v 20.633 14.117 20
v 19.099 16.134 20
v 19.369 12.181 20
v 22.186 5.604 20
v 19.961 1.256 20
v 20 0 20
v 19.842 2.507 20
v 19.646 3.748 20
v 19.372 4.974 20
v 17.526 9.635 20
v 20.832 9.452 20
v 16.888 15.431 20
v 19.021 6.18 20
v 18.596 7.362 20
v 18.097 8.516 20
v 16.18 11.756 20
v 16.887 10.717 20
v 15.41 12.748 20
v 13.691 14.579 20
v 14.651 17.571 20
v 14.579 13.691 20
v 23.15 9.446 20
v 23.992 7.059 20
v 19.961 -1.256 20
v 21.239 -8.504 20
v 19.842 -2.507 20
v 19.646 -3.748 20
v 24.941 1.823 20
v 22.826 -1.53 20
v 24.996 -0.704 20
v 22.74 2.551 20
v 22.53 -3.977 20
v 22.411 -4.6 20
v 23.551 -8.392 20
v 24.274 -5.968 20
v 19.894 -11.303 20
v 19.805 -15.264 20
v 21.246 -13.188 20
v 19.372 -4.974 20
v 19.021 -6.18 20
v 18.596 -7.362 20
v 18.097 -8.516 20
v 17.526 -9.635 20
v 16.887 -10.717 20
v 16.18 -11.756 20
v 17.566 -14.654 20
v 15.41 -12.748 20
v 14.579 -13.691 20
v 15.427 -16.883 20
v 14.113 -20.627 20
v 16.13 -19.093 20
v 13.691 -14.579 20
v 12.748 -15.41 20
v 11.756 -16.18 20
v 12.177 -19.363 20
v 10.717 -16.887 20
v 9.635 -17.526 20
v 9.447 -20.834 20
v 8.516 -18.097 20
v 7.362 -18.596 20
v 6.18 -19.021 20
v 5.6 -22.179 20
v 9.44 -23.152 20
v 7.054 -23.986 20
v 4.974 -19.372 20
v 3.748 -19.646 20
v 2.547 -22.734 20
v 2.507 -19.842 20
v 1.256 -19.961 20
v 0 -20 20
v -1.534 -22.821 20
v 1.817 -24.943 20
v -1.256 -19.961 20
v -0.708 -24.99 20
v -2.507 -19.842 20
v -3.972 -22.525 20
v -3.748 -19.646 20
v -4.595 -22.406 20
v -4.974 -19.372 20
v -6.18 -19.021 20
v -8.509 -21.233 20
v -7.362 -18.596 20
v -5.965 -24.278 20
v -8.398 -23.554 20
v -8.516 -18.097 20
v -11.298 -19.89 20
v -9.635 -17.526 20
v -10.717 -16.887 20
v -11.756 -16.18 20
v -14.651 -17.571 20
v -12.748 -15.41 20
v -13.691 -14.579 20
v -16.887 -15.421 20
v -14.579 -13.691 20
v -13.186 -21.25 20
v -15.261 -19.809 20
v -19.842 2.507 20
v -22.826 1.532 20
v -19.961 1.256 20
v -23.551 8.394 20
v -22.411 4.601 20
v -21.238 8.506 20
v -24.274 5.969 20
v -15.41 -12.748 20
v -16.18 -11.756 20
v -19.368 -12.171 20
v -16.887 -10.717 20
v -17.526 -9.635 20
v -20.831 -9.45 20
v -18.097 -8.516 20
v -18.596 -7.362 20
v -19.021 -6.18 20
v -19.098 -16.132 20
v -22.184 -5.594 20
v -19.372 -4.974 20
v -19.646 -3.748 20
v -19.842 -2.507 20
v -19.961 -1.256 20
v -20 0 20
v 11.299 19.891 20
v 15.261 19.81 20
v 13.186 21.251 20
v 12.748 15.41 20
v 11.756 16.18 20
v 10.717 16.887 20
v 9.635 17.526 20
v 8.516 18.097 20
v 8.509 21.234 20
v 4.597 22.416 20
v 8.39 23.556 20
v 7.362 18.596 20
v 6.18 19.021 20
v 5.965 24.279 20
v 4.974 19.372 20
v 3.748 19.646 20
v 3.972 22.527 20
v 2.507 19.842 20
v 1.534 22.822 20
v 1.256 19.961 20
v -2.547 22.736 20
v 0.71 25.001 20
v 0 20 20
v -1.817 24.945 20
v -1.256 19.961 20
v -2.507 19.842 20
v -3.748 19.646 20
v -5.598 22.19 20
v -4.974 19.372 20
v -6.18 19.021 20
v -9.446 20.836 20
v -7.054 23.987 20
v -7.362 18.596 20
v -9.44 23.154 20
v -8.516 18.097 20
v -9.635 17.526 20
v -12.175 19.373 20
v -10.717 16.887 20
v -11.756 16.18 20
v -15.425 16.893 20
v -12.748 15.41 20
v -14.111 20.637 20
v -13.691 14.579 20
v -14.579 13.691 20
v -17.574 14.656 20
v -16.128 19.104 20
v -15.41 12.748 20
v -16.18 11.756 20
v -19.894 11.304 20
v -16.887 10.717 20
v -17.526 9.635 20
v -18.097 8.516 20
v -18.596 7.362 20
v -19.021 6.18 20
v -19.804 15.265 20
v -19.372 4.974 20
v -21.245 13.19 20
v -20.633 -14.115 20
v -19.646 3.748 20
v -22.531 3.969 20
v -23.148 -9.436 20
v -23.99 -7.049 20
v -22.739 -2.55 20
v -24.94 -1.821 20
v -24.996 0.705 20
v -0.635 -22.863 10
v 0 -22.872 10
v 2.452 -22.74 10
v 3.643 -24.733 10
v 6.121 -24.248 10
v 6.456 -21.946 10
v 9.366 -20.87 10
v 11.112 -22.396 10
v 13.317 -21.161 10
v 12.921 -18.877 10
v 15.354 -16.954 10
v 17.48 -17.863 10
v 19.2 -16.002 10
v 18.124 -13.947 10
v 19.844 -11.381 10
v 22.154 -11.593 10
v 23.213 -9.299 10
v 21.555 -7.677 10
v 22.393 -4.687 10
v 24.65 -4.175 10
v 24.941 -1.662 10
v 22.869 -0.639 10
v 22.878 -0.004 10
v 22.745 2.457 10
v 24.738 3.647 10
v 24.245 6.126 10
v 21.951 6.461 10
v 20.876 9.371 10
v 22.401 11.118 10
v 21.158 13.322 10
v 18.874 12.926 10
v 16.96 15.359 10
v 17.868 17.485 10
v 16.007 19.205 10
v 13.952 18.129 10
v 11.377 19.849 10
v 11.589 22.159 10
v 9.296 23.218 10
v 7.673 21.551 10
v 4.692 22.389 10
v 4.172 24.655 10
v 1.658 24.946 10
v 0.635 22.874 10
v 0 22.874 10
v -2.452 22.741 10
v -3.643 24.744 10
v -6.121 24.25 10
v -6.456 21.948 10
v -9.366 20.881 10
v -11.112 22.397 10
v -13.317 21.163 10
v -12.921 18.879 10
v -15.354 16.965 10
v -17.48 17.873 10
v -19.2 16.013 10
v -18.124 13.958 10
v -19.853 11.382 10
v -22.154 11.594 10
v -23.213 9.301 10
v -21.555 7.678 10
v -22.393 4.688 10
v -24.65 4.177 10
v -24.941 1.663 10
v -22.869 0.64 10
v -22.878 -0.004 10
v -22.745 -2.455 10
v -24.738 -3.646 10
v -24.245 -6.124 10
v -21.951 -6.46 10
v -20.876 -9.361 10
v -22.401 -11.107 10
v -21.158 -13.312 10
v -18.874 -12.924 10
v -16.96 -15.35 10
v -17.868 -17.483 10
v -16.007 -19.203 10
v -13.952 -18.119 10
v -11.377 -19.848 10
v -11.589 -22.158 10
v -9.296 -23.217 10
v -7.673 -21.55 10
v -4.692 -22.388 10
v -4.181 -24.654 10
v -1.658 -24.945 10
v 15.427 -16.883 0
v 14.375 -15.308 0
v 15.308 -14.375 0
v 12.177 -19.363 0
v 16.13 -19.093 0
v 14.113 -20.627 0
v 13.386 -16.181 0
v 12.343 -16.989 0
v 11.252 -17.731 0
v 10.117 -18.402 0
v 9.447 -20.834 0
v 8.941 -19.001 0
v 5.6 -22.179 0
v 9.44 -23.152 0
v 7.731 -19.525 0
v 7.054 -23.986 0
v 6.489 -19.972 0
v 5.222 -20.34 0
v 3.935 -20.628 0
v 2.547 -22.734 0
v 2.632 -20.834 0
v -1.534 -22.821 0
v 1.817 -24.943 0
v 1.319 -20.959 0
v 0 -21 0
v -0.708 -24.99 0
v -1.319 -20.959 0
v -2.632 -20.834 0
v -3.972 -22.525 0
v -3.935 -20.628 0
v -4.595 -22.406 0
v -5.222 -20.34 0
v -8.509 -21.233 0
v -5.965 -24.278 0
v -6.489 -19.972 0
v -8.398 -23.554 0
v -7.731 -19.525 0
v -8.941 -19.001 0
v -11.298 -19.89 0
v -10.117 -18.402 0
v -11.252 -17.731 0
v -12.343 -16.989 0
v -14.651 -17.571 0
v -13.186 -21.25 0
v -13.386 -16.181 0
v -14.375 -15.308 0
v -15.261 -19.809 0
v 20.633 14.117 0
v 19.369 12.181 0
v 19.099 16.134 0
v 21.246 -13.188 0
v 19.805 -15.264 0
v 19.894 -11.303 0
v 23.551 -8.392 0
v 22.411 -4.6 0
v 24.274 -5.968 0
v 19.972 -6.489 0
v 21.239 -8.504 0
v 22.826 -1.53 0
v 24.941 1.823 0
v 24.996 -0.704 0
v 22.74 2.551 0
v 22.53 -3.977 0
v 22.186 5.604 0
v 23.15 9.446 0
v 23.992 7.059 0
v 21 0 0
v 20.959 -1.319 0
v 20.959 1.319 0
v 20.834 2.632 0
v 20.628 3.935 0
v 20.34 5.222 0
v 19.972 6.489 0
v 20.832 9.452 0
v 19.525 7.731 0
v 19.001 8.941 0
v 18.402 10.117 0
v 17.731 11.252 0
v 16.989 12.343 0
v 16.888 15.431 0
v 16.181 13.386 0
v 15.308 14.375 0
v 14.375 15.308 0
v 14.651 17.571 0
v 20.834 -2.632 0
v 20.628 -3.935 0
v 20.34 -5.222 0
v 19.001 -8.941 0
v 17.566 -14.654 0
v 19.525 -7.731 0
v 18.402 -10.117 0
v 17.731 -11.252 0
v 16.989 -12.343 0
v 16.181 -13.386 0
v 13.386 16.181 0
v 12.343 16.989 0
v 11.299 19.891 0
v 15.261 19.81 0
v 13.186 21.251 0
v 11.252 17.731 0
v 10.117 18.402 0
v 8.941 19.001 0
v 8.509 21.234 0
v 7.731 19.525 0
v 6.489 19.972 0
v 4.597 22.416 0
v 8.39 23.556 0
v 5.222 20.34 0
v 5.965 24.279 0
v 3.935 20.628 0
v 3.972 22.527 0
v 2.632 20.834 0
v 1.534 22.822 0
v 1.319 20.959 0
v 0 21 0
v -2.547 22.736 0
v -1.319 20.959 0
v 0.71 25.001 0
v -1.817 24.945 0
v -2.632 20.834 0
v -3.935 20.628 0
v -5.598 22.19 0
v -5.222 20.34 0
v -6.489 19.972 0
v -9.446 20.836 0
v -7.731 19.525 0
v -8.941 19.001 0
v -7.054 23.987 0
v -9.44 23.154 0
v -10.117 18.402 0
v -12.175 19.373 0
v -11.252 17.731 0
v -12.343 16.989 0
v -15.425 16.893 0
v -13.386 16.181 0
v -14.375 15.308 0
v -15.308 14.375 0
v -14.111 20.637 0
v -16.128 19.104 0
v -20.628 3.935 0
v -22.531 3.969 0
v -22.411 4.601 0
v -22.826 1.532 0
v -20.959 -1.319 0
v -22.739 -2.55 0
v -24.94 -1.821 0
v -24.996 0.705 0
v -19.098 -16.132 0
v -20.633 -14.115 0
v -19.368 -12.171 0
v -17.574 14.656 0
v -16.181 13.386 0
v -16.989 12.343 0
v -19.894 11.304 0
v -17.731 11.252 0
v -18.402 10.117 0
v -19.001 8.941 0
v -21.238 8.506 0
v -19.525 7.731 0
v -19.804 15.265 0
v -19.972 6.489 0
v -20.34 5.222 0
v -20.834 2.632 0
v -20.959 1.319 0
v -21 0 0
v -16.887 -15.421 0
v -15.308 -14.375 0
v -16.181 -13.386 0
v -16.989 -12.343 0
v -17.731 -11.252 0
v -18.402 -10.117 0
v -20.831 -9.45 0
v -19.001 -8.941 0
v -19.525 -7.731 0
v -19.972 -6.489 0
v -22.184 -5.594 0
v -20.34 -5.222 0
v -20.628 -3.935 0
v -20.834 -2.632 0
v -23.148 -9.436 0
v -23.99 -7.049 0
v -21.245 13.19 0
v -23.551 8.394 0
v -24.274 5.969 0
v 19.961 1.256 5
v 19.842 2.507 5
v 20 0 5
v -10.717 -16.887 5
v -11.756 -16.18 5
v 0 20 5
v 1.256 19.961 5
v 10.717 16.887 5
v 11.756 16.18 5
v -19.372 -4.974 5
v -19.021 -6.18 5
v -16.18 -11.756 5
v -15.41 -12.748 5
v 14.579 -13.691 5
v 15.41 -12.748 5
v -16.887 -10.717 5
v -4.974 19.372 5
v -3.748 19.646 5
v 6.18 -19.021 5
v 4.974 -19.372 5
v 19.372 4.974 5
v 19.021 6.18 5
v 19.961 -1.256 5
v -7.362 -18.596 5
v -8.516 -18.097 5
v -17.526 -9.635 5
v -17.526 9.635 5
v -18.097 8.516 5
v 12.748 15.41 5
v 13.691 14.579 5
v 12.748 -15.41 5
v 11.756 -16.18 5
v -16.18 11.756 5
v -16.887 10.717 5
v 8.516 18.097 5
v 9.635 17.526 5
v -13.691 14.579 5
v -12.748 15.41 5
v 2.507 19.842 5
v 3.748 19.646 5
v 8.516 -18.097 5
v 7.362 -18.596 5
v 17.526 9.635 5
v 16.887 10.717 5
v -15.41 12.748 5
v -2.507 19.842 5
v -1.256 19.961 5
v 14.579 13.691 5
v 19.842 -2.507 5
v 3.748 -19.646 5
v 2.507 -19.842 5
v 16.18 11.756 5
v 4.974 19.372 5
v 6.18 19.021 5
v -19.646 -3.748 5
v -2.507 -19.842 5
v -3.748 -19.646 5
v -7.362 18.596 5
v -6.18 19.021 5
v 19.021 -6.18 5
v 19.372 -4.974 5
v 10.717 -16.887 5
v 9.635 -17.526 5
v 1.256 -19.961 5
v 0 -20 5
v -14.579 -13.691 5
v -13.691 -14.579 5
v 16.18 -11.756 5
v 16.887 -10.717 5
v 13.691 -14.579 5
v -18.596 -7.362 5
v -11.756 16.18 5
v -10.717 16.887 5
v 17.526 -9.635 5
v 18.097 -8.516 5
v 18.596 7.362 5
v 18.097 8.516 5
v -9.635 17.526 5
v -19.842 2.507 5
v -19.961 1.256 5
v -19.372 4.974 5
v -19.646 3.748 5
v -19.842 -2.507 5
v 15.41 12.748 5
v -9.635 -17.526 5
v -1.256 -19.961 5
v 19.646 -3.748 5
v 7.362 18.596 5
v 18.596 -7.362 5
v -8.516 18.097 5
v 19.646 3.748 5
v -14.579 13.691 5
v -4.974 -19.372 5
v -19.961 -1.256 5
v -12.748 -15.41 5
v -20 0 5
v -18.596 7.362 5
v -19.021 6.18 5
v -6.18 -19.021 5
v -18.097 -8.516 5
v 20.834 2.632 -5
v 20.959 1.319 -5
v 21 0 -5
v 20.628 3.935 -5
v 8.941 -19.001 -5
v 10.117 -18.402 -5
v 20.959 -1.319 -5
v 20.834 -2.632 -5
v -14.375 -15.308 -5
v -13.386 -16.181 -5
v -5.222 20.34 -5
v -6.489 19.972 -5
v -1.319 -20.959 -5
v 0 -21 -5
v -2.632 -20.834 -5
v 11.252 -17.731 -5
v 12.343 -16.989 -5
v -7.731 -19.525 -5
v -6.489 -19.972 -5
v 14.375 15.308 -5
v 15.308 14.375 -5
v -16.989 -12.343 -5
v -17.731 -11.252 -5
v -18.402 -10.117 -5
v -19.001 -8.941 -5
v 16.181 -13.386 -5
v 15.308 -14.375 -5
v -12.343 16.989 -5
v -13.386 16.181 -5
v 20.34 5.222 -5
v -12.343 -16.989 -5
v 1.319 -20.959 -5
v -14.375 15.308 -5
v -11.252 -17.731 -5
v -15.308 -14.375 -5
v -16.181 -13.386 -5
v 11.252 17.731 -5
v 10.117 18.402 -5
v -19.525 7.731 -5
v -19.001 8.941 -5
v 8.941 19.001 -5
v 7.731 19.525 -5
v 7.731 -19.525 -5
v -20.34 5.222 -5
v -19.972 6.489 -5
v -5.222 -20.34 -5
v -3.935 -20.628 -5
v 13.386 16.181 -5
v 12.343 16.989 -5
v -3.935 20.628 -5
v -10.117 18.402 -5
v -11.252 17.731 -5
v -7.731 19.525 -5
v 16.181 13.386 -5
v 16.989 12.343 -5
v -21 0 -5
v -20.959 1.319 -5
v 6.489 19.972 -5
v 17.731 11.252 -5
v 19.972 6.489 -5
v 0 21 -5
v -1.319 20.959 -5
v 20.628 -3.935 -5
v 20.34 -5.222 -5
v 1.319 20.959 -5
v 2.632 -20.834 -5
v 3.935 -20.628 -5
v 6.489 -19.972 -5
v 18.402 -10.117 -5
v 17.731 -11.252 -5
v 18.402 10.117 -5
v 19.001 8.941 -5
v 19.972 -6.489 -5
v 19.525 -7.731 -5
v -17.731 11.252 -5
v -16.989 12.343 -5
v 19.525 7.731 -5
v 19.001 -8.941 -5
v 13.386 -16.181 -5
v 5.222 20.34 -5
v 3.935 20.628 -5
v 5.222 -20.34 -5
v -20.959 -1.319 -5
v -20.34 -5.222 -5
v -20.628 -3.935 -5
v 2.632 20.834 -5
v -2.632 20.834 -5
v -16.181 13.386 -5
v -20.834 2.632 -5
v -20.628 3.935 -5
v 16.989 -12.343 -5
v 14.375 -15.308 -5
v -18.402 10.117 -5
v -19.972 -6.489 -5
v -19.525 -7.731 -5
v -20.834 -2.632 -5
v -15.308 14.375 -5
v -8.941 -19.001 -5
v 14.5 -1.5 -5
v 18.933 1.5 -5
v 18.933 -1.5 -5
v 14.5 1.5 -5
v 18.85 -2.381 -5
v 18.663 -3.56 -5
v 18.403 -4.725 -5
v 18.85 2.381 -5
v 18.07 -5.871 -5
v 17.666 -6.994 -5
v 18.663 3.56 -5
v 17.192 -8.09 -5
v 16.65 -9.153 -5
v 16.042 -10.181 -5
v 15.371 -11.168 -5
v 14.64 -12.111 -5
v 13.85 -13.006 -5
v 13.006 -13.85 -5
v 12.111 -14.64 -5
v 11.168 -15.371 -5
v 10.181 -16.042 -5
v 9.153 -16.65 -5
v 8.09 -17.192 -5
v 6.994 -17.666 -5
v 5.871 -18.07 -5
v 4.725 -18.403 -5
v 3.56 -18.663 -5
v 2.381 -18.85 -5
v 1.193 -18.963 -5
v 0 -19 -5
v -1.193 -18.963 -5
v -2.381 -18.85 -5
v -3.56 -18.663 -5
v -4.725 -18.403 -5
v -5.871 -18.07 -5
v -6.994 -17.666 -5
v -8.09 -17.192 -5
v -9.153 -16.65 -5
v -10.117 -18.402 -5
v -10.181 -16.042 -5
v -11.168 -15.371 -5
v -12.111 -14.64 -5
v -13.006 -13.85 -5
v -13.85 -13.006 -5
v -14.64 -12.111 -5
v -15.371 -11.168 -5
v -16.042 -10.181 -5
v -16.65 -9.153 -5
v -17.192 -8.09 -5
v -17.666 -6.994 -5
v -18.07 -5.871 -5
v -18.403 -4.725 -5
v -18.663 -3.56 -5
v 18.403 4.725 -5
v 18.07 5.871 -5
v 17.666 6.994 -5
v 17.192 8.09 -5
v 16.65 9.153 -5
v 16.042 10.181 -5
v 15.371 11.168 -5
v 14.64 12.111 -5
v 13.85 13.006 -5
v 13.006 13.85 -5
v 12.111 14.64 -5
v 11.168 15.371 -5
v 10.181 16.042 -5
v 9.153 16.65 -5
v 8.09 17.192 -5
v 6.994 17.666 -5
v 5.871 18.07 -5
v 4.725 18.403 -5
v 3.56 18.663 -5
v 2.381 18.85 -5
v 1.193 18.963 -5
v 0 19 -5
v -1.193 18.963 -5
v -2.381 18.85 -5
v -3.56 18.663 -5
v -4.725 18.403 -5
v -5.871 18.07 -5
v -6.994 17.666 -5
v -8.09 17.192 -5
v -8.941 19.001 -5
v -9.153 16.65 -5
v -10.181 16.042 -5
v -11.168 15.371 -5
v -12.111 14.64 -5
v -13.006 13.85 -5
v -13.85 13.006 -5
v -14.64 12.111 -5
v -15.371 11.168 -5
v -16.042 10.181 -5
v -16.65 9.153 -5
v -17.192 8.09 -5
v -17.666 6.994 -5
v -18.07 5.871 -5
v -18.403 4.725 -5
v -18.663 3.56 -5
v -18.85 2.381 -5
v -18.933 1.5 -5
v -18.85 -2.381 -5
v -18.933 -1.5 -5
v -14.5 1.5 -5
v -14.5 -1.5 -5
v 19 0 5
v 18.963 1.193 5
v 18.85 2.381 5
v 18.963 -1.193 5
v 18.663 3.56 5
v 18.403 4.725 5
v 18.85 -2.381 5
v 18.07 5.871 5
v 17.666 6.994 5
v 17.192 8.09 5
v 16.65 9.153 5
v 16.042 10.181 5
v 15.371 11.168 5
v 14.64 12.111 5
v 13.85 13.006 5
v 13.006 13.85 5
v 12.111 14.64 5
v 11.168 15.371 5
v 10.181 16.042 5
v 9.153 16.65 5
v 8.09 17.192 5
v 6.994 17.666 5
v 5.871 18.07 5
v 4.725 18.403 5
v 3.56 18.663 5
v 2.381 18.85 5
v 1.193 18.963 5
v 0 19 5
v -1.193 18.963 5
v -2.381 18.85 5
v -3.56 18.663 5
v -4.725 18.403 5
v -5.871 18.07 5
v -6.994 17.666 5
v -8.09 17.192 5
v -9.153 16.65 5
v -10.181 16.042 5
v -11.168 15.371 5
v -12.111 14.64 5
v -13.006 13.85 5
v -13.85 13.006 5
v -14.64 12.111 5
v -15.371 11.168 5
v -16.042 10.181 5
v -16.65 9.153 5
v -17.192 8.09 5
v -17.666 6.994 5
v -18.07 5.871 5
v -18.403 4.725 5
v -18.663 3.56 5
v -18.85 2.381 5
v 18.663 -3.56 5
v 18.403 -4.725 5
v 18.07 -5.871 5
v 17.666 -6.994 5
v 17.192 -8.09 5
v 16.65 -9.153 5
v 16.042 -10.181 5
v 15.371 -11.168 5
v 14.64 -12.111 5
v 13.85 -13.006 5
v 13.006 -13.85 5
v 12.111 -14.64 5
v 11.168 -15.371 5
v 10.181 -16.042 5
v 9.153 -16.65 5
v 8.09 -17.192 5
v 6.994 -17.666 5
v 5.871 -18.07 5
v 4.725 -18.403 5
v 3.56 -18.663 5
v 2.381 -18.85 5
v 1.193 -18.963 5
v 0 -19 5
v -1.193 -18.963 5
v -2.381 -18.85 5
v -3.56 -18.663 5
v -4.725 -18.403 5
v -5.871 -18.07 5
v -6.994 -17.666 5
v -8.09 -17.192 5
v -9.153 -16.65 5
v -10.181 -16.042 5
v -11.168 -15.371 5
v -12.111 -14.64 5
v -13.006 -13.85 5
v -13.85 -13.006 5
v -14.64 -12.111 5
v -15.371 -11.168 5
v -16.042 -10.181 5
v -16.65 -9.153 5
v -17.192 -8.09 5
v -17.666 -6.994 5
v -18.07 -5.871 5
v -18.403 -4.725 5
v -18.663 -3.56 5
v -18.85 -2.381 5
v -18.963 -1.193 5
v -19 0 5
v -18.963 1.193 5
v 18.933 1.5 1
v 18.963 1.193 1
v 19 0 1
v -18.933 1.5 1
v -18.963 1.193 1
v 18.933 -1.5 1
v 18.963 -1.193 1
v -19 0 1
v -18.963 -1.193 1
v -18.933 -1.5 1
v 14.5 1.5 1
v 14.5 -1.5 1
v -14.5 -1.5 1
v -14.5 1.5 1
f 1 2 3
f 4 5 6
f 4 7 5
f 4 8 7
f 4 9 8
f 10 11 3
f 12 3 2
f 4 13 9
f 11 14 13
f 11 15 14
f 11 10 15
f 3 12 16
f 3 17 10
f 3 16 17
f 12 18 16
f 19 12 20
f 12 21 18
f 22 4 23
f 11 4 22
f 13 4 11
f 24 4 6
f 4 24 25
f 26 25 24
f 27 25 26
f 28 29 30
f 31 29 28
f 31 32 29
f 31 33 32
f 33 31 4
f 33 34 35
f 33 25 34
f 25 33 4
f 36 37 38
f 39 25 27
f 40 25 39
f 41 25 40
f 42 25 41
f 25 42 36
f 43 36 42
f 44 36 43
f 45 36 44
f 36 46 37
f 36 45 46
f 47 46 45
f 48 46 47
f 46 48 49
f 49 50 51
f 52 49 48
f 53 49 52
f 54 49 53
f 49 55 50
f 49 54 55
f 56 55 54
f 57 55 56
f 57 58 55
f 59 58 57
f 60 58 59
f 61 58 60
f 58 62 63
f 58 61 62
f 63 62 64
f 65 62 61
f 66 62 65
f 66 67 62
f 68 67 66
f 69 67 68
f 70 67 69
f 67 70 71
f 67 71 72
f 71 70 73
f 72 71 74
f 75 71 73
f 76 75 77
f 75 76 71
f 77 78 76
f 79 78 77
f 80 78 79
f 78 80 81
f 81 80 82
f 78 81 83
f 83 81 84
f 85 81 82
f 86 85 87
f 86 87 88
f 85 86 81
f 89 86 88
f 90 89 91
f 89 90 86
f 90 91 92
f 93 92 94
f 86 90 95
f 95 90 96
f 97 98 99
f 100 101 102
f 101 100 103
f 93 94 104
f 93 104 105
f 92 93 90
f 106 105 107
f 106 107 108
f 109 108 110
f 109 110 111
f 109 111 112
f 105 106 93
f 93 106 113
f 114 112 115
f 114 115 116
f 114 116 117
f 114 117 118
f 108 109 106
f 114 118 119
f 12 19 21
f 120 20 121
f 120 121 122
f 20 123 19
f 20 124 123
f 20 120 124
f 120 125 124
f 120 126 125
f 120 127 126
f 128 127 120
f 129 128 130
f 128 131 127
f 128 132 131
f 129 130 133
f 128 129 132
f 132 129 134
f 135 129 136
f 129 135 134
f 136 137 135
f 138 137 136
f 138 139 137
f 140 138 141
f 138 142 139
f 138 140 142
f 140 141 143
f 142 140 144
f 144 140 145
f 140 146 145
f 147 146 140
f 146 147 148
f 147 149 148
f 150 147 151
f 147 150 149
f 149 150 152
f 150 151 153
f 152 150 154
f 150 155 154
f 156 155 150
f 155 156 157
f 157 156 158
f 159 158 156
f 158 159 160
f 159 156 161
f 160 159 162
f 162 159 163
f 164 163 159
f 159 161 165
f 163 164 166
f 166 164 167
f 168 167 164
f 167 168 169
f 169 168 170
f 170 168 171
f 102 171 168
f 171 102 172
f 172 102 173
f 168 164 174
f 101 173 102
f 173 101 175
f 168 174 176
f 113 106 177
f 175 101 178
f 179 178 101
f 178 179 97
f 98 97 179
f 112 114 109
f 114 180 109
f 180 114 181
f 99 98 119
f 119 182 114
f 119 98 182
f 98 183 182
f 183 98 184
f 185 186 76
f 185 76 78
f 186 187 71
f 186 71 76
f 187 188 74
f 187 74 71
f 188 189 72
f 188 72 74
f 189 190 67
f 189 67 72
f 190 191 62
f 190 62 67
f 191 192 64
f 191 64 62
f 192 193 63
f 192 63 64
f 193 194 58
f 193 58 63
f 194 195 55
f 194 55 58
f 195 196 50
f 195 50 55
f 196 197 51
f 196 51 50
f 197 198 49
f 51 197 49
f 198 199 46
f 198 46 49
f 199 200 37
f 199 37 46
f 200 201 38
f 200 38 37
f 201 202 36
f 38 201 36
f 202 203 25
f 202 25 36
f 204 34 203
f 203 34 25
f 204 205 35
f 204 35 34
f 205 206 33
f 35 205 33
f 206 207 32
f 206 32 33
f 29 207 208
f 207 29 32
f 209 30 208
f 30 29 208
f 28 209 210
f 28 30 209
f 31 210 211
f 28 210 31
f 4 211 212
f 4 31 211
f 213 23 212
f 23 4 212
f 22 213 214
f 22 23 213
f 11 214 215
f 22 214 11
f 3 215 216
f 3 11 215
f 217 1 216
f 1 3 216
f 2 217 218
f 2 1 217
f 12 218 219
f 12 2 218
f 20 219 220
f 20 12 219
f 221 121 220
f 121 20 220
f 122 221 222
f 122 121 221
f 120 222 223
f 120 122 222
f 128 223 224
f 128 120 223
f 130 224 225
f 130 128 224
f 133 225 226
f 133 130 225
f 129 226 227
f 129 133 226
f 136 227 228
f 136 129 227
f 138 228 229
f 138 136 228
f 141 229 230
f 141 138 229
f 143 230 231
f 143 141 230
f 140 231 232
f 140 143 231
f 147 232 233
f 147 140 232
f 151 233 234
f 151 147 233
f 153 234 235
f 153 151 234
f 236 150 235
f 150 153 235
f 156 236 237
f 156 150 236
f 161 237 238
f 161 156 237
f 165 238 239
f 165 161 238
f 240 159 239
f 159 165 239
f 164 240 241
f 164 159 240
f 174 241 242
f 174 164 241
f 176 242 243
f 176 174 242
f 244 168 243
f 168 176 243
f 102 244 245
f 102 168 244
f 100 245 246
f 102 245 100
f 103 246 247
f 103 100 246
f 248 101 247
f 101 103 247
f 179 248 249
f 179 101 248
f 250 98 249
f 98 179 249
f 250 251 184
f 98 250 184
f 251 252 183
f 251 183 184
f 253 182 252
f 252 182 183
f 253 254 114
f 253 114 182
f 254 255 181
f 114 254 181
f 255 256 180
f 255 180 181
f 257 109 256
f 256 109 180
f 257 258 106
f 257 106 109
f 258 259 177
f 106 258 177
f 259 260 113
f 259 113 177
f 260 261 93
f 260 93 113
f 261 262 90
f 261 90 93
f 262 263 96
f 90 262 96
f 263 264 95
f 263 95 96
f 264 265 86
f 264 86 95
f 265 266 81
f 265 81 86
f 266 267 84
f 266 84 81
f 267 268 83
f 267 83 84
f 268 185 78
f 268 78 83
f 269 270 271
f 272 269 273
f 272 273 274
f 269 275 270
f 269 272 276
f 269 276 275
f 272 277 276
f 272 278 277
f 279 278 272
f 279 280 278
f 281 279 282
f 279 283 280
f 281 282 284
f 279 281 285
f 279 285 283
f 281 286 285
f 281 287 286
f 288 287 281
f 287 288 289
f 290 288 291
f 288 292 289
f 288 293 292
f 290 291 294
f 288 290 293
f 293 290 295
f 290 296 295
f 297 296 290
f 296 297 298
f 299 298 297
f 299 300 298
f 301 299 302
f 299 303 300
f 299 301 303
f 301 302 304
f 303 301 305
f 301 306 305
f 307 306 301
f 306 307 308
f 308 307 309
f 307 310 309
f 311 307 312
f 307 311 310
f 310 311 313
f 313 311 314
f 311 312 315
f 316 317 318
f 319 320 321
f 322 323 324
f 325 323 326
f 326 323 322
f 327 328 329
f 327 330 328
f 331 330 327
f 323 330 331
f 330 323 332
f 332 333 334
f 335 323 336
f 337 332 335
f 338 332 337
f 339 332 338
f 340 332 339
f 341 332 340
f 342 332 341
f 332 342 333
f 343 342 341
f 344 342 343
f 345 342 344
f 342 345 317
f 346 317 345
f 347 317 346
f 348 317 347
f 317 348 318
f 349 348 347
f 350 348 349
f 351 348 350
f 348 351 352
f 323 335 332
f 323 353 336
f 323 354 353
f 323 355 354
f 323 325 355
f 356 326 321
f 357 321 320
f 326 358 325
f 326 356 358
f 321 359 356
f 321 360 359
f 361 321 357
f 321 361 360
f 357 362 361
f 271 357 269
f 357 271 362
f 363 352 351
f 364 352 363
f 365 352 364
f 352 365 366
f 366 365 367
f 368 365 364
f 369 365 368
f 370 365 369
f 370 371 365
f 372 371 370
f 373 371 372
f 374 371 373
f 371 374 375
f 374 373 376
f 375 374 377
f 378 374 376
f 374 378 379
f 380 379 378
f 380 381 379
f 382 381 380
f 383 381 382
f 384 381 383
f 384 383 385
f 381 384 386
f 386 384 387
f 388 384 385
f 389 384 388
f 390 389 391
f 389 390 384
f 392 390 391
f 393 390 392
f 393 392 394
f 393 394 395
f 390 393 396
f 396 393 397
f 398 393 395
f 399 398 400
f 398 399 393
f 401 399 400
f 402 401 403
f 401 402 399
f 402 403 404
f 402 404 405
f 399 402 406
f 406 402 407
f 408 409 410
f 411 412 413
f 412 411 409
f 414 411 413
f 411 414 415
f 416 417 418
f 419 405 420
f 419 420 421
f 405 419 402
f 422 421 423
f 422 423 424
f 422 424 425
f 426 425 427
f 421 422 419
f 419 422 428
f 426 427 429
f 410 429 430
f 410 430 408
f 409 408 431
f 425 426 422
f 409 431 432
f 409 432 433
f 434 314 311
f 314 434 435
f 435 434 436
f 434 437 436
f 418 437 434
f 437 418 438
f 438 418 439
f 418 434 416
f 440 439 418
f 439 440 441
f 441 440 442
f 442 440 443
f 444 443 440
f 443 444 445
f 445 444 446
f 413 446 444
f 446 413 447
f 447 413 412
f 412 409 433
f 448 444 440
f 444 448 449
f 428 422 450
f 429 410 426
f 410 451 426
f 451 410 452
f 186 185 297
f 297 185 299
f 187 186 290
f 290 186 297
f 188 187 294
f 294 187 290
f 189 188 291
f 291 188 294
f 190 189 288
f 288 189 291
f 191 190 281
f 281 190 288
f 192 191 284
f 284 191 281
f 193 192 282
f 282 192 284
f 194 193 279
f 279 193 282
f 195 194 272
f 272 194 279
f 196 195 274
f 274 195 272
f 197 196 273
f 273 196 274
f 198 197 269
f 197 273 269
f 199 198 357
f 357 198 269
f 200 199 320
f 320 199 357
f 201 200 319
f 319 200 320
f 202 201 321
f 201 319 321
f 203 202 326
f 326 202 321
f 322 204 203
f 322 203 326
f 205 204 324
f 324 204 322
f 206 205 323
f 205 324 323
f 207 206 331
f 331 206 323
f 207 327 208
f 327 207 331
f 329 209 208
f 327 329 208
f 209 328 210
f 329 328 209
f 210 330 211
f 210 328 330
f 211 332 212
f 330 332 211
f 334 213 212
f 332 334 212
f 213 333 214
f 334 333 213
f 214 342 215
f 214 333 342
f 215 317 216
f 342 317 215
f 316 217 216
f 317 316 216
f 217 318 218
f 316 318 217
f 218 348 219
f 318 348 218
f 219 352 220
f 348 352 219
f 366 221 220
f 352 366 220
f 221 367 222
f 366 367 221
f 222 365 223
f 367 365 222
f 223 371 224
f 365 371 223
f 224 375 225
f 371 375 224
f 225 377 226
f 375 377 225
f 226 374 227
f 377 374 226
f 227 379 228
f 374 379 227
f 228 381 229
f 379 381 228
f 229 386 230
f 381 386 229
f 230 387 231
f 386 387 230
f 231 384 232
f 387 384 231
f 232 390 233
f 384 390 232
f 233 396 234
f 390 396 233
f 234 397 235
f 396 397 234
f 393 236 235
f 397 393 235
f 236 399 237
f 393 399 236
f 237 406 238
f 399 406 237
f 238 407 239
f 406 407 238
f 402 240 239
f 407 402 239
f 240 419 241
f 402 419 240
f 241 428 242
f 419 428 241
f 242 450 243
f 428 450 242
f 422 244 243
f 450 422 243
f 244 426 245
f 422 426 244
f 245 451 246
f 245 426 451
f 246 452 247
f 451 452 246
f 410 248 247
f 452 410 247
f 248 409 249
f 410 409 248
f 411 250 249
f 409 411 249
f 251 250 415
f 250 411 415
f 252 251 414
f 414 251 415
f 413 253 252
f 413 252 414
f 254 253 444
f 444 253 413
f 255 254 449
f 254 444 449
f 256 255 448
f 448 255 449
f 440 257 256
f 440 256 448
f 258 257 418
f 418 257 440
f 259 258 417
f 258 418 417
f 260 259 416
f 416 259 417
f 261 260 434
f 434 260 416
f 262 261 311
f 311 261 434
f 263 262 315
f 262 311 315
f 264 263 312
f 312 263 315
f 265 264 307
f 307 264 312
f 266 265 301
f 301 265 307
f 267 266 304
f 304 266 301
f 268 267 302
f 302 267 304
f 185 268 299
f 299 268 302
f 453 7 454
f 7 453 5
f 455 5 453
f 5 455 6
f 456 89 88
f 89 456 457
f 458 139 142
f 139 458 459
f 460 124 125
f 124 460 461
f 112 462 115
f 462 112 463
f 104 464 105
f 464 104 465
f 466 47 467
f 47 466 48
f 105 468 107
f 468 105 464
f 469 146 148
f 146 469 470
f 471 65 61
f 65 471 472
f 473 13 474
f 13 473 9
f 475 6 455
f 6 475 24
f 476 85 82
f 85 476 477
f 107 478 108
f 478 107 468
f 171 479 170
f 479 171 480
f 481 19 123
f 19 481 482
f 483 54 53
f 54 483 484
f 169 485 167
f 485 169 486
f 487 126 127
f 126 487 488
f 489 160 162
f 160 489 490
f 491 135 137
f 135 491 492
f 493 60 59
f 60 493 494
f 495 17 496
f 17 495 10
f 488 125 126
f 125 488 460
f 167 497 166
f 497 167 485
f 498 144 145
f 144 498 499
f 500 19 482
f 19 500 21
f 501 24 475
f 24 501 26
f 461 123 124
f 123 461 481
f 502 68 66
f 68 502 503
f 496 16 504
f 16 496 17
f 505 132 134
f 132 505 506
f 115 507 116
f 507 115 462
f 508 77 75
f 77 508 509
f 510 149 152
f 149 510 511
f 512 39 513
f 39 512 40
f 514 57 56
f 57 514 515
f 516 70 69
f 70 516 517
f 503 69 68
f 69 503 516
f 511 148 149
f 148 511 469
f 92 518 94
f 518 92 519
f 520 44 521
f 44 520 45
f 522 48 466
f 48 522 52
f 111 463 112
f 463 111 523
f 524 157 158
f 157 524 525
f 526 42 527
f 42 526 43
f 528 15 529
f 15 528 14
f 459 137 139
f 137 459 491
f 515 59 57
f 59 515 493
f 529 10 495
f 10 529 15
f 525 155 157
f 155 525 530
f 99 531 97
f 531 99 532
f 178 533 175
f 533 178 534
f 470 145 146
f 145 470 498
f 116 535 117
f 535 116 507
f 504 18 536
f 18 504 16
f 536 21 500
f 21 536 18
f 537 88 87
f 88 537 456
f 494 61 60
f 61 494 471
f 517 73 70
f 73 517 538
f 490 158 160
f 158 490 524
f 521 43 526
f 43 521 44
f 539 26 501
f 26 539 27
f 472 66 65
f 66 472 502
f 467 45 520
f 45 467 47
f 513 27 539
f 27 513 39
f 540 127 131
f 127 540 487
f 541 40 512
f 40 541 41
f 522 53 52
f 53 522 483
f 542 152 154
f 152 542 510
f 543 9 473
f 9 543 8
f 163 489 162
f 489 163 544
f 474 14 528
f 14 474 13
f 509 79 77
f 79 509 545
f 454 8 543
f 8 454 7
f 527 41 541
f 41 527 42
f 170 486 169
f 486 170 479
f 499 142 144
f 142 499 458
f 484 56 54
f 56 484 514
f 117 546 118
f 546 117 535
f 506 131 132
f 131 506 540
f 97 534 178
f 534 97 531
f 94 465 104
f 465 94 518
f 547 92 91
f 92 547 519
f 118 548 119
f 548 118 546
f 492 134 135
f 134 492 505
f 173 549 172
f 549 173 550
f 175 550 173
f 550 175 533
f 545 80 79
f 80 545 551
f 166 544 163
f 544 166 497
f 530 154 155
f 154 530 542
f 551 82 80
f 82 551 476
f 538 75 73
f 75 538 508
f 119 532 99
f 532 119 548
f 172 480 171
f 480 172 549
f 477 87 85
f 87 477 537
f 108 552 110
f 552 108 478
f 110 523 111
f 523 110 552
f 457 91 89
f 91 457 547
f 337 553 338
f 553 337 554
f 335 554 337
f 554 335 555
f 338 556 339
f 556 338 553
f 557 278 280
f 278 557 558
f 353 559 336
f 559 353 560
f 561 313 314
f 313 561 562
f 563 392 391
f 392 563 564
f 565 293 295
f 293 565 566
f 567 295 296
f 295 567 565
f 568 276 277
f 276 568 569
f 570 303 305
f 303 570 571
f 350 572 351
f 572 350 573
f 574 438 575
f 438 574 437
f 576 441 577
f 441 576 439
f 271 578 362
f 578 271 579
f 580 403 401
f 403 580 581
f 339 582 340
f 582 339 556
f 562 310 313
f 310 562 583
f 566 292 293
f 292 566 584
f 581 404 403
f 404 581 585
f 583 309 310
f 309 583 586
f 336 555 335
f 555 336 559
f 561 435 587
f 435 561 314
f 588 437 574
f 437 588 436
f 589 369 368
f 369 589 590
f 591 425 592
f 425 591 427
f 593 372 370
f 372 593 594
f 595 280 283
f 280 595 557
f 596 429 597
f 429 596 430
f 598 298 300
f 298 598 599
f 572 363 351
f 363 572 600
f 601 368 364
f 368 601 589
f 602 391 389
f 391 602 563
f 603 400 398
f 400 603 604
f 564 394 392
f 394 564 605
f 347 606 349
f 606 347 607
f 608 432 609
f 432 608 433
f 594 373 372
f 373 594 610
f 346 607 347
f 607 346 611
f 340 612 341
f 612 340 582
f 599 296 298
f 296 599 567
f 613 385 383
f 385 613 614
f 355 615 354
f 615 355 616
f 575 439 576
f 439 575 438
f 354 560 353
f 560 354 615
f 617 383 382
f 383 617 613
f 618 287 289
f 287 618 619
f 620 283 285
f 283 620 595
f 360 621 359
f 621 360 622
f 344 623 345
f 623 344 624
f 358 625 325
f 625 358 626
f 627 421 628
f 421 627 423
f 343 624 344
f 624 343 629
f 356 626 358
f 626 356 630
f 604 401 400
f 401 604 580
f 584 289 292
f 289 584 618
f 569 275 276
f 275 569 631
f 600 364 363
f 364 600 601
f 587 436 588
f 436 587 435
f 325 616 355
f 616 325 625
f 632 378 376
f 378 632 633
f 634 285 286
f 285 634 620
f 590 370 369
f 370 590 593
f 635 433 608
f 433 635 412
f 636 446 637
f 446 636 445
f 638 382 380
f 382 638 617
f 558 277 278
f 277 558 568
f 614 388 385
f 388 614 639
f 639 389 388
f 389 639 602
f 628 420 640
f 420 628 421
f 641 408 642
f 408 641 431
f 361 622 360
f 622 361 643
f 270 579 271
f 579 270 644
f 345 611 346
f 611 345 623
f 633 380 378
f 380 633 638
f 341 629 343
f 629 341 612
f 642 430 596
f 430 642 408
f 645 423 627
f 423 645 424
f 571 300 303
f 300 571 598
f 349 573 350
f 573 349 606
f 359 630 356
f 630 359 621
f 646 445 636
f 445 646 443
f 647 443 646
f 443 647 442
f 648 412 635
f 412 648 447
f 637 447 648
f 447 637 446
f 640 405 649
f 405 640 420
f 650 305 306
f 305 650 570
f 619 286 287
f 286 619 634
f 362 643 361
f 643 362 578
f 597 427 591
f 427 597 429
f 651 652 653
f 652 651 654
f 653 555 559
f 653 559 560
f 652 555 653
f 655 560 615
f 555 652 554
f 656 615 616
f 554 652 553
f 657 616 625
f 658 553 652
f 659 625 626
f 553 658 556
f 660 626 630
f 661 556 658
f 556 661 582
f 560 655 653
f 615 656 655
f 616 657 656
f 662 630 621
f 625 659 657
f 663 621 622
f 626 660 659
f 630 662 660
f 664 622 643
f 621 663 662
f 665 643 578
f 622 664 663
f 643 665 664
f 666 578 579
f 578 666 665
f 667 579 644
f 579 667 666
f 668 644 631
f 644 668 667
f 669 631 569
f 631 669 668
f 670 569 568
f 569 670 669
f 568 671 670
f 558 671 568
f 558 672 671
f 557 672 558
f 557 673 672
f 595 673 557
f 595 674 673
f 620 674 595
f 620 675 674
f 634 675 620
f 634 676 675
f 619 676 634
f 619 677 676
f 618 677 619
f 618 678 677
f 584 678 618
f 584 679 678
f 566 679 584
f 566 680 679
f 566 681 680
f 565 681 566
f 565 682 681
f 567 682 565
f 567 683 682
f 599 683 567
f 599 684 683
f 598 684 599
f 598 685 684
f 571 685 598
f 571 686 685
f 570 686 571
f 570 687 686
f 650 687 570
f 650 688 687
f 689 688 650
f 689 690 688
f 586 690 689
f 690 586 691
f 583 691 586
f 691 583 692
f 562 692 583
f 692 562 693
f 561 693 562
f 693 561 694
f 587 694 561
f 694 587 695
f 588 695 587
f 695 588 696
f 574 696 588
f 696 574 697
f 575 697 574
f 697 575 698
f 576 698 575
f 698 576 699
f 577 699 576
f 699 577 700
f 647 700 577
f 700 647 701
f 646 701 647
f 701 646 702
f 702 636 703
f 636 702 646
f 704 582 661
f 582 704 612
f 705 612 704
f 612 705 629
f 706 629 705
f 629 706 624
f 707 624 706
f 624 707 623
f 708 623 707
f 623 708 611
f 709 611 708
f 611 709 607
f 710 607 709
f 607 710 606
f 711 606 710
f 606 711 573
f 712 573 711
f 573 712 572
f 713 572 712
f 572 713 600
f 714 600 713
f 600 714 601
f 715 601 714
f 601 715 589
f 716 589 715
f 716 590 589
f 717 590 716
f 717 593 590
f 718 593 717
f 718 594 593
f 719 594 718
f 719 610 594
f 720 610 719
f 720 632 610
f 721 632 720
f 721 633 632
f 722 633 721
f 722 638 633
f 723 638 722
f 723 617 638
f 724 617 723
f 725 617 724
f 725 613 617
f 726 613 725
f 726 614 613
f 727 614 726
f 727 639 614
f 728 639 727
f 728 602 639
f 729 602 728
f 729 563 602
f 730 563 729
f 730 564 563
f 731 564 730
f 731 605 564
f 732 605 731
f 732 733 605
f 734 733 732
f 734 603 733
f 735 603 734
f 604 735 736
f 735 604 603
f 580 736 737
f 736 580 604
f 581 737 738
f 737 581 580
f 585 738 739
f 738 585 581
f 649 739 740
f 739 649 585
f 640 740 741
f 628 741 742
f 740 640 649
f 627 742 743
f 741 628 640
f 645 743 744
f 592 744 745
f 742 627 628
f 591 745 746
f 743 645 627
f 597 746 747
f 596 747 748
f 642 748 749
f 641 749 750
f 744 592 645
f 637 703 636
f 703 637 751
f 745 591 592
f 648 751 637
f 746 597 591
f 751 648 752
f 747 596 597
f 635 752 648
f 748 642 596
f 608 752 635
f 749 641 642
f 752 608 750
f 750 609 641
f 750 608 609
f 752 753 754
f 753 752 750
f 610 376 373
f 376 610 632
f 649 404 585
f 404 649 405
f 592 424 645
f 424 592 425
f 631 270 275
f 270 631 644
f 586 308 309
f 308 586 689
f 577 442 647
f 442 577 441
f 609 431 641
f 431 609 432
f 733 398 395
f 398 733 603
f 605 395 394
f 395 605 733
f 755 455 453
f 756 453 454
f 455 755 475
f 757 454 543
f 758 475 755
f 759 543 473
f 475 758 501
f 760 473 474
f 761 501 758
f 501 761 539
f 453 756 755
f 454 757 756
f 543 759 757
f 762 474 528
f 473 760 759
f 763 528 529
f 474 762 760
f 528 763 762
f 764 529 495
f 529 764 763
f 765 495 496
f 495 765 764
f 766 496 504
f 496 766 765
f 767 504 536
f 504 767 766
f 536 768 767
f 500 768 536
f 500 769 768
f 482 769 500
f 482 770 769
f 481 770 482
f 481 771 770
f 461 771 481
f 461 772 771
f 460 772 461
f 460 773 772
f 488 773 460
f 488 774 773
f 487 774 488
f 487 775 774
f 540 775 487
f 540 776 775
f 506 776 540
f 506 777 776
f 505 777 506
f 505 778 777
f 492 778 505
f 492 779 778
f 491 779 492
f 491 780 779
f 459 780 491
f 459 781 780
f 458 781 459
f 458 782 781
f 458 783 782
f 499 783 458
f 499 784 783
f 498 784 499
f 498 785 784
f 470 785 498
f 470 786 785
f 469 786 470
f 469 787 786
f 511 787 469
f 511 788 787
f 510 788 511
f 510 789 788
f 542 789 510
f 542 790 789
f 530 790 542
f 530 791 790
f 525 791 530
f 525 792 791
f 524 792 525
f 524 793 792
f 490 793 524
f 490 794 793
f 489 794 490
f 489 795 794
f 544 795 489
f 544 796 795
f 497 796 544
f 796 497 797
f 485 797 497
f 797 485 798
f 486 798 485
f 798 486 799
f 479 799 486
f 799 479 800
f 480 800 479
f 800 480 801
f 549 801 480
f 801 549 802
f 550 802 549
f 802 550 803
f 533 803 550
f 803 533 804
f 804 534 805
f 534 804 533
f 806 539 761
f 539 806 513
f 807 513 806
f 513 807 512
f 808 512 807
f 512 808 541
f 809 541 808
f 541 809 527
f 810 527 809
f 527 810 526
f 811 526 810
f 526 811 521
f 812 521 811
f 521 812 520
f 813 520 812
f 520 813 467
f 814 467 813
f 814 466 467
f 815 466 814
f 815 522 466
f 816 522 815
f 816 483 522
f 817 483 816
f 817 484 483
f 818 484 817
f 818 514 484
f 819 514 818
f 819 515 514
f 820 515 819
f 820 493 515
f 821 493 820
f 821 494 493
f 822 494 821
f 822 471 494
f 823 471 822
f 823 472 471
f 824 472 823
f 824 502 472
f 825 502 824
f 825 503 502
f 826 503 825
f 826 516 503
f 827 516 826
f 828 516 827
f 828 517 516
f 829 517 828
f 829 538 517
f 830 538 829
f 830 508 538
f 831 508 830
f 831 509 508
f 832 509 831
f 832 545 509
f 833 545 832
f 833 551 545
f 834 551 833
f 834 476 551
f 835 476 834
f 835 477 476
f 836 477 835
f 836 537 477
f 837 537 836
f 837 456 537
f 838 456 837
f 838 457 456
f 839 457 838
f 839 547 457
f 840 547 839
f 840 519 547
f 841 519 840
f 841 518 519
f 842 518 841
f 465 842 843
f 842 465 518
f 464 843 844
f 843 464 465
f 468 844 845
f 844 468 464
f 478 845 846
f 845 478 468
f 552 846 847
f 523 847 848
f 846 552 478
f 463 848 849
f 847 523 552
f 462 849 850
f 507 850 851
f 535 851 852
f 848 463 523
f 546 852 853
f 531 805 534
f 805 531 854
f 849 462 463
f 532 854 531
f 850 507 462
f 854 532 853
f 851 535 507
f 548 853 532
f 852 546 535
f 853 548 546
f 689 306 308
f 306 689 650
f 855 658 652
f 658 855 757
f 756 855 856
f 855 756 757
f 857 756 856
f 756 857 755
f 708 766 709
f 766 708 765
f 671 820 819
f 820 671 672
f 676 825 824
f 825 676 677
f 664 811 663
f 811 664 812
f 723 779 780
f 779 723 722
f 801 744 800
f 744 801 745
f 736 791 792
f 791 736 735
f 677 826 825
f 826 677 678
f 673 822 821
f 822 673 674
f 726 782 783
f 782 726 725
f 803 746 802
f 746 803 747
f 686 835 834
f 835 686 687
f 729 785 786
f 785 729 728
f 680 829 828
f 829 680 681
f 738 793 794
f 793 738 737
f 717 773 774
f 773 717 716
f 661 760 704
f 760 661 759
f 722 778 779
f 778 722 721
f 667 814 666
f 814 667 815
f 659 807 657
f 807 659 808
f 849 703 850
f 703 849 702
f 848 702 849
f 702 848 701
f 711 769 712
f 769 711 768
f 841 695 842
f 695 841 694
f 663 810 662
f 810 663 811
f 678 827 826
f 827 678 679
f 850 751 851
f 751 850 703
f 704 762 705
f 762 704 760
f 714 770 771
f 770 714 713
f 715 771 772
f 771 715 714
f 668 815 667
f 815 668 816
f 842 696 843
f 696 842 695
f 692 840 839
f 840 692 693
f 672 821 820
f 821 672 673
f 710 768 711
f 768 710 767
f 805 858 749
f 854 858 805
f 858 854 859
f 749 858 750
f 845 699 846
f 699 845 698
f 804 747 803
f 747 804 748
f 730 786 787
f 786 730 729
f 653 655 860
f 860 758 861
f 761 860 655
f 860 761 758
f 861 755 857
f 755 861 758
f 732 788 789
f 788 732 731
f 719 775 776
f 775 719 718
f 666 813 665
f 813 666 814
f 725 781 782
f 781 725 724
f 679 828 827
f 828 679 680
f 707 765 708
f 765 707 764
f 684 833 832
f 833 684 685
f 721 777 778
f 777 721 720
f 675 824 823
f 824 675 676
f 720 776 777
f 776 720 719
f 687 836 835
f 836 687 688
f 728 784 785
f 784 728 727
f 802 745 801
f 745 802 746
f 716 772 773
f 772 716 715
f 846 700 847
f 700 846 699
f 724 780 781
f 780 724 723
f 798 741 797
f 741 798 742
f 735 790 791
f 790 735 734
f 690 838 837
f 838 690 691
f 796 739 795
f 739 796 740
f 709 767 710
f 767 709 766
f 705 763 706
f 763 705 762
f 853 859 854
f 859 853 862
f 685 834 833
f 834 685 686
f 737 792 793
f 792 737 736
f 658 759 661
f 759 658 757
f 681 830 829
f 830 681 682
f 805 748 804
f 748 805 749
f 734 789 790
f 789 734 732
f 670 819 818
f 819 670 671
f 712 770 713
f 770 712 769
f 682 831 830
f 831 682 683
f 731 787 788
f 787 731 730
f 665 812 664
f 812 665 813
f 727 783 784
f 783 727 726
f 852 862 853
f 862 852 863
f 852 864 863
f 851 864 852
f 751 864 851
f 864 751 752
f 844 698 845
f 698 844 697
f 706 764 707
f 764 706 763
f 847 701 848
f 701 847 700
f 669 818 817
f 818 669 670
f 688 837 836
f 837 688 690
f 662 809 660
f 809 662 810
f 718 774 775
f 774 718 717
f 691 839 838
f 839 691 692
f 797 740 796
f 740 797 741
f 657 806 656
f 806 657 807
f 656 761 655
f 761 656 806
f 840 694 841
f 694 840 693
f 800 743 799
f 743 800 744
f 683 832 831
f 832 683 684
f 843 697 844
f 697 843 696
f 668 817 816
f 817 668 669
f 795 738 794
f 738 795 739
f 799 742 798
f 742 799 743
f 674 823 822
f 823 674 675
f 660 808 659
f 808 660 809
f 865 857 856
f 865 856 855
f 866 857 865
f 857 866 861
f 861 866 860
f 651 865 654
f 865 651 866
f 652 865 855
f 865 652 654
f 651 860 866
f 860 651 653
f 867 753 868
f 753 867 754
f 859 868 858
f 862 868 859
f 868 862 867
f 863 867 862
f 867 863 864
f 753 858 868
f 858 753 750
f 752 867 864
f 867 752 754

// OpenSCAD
// увеличим ширину фиксирующего обода для внешней формы по сравнению
// с пазом под обод на внутренней форме, чтобы учесть
// погрешность при печати на FDM-принтере
//outer_box_half1(4);
//outer_box_half2(4);
inner_surface(2);

/**
 * Внутренняя поверхность покрышки, должна совпадать 
 * с рельефом колеса.
 * @param hoop_width - ширина обода, выступающего вниз для
 * для фиксации на площадке внешней части формы.
 */
module inner_surface(hoop_width=2) {
  difference() {
    // рельеф колеса
    translate([0, 0, 10]) {
      linear_extrude(height=10, twist=10) 
          import(file = "покрышка-внутр.dxf");
      mirror([0, 0, -1]) 
        linear_extrude(height=10, twist=10) 
          import(file = "покрышка-внутр.dxf");
    }
    // вычтем изнутри цилиндр для экономии пластика
    translate([0, 0, -1])
      cylinder(h=22, r=20, $fn=100);
  }

  // выступающий вниз обод для фиксации на площадке
  difference() {
    translate([0, 0, -5])
      cylinder(h=10, r=20+hoop_width/2, $fn=100);

    translate([0, 0, -6])
      cylinder(h=12, r=20-hoop_width/2, $fn=100);
  }

  // фиксторы вращения
  translate([14.5, -1.5, -5])
    cube([6, 3, 6]);
  translate([-20.5, -1.5, -5])
    cube([6, 3, 6]);
}

/**
 * Первая половина внешней коробки.
 * @param hoop_width - ширина обода, выступающего вниз для
 * для фиксации на площадке внешней части формы.
 */
module outer_box_half1(hoop_width=2) {
  difference() {
    outer_box(hoop_width);

    translate([0, -34, -8])
        cube([34, 68, 29]);
  }
}

/**
 * Вторая половина внешней коробки.
 * @param hoop_width - ширина обода, выступающего вниз для
 * для фиксации на площадке внешней части формы.
 */
module outer_box_half2(hoop_width=2) {
  difference() {
    outer_box(hoop_width);

    translate([-34, -34, -8])
        cube([34, 68, 29]);
  }
}

/**
 * Внешняя коробка с рельефом протектора.
 * @param hoop_width - ширина обода, выступающего вниз для
 * для фиксации на площадке внешней части формы.
 */
module outer_box(hoop_width=2) {
  difference() {
    // матрица для рисунка протектора
    translate([0, 0, -7])
      cylinder(h=27, r=33, $fn=100);
    
    // рельефный протектор
    tyre_pattern();

    // паз для выступающего вниз обода
    difference() {
      translate([0, 0, -5.5])
        cylinder(h=10, r=20+hoop_width/2, $fn=100);

      translate([0, 0, -6])
        cylinder(h=12, r=20-hoop_width/2, $fn=100);
    }
      
    // пазы для фиксаторов
    translate([14, -2, -5.5])
      cube([6, 4, 6]);
    translate([-20, -2, -5.5])
      cube([6, 4, 6]);

    // внутренняя дырка для экономии пластика
    translate([0, 0, -10])
      cylinder(h=20, r=13, $fn=100);
  }
}

/** Рисунок проектора */
module tyre_pattern() {
  // рельефный протектор
  translate([0, 0, 10]) {
    linear_extrude(height=10, twist=10) 
        import(file = "покрышка-внешн.dxf");
    mirror([0, 0, -1]) 
      linear_extrude(height=10, twist=10) 
        import(file = "покрышка-внешн.dxf");
  }
}
